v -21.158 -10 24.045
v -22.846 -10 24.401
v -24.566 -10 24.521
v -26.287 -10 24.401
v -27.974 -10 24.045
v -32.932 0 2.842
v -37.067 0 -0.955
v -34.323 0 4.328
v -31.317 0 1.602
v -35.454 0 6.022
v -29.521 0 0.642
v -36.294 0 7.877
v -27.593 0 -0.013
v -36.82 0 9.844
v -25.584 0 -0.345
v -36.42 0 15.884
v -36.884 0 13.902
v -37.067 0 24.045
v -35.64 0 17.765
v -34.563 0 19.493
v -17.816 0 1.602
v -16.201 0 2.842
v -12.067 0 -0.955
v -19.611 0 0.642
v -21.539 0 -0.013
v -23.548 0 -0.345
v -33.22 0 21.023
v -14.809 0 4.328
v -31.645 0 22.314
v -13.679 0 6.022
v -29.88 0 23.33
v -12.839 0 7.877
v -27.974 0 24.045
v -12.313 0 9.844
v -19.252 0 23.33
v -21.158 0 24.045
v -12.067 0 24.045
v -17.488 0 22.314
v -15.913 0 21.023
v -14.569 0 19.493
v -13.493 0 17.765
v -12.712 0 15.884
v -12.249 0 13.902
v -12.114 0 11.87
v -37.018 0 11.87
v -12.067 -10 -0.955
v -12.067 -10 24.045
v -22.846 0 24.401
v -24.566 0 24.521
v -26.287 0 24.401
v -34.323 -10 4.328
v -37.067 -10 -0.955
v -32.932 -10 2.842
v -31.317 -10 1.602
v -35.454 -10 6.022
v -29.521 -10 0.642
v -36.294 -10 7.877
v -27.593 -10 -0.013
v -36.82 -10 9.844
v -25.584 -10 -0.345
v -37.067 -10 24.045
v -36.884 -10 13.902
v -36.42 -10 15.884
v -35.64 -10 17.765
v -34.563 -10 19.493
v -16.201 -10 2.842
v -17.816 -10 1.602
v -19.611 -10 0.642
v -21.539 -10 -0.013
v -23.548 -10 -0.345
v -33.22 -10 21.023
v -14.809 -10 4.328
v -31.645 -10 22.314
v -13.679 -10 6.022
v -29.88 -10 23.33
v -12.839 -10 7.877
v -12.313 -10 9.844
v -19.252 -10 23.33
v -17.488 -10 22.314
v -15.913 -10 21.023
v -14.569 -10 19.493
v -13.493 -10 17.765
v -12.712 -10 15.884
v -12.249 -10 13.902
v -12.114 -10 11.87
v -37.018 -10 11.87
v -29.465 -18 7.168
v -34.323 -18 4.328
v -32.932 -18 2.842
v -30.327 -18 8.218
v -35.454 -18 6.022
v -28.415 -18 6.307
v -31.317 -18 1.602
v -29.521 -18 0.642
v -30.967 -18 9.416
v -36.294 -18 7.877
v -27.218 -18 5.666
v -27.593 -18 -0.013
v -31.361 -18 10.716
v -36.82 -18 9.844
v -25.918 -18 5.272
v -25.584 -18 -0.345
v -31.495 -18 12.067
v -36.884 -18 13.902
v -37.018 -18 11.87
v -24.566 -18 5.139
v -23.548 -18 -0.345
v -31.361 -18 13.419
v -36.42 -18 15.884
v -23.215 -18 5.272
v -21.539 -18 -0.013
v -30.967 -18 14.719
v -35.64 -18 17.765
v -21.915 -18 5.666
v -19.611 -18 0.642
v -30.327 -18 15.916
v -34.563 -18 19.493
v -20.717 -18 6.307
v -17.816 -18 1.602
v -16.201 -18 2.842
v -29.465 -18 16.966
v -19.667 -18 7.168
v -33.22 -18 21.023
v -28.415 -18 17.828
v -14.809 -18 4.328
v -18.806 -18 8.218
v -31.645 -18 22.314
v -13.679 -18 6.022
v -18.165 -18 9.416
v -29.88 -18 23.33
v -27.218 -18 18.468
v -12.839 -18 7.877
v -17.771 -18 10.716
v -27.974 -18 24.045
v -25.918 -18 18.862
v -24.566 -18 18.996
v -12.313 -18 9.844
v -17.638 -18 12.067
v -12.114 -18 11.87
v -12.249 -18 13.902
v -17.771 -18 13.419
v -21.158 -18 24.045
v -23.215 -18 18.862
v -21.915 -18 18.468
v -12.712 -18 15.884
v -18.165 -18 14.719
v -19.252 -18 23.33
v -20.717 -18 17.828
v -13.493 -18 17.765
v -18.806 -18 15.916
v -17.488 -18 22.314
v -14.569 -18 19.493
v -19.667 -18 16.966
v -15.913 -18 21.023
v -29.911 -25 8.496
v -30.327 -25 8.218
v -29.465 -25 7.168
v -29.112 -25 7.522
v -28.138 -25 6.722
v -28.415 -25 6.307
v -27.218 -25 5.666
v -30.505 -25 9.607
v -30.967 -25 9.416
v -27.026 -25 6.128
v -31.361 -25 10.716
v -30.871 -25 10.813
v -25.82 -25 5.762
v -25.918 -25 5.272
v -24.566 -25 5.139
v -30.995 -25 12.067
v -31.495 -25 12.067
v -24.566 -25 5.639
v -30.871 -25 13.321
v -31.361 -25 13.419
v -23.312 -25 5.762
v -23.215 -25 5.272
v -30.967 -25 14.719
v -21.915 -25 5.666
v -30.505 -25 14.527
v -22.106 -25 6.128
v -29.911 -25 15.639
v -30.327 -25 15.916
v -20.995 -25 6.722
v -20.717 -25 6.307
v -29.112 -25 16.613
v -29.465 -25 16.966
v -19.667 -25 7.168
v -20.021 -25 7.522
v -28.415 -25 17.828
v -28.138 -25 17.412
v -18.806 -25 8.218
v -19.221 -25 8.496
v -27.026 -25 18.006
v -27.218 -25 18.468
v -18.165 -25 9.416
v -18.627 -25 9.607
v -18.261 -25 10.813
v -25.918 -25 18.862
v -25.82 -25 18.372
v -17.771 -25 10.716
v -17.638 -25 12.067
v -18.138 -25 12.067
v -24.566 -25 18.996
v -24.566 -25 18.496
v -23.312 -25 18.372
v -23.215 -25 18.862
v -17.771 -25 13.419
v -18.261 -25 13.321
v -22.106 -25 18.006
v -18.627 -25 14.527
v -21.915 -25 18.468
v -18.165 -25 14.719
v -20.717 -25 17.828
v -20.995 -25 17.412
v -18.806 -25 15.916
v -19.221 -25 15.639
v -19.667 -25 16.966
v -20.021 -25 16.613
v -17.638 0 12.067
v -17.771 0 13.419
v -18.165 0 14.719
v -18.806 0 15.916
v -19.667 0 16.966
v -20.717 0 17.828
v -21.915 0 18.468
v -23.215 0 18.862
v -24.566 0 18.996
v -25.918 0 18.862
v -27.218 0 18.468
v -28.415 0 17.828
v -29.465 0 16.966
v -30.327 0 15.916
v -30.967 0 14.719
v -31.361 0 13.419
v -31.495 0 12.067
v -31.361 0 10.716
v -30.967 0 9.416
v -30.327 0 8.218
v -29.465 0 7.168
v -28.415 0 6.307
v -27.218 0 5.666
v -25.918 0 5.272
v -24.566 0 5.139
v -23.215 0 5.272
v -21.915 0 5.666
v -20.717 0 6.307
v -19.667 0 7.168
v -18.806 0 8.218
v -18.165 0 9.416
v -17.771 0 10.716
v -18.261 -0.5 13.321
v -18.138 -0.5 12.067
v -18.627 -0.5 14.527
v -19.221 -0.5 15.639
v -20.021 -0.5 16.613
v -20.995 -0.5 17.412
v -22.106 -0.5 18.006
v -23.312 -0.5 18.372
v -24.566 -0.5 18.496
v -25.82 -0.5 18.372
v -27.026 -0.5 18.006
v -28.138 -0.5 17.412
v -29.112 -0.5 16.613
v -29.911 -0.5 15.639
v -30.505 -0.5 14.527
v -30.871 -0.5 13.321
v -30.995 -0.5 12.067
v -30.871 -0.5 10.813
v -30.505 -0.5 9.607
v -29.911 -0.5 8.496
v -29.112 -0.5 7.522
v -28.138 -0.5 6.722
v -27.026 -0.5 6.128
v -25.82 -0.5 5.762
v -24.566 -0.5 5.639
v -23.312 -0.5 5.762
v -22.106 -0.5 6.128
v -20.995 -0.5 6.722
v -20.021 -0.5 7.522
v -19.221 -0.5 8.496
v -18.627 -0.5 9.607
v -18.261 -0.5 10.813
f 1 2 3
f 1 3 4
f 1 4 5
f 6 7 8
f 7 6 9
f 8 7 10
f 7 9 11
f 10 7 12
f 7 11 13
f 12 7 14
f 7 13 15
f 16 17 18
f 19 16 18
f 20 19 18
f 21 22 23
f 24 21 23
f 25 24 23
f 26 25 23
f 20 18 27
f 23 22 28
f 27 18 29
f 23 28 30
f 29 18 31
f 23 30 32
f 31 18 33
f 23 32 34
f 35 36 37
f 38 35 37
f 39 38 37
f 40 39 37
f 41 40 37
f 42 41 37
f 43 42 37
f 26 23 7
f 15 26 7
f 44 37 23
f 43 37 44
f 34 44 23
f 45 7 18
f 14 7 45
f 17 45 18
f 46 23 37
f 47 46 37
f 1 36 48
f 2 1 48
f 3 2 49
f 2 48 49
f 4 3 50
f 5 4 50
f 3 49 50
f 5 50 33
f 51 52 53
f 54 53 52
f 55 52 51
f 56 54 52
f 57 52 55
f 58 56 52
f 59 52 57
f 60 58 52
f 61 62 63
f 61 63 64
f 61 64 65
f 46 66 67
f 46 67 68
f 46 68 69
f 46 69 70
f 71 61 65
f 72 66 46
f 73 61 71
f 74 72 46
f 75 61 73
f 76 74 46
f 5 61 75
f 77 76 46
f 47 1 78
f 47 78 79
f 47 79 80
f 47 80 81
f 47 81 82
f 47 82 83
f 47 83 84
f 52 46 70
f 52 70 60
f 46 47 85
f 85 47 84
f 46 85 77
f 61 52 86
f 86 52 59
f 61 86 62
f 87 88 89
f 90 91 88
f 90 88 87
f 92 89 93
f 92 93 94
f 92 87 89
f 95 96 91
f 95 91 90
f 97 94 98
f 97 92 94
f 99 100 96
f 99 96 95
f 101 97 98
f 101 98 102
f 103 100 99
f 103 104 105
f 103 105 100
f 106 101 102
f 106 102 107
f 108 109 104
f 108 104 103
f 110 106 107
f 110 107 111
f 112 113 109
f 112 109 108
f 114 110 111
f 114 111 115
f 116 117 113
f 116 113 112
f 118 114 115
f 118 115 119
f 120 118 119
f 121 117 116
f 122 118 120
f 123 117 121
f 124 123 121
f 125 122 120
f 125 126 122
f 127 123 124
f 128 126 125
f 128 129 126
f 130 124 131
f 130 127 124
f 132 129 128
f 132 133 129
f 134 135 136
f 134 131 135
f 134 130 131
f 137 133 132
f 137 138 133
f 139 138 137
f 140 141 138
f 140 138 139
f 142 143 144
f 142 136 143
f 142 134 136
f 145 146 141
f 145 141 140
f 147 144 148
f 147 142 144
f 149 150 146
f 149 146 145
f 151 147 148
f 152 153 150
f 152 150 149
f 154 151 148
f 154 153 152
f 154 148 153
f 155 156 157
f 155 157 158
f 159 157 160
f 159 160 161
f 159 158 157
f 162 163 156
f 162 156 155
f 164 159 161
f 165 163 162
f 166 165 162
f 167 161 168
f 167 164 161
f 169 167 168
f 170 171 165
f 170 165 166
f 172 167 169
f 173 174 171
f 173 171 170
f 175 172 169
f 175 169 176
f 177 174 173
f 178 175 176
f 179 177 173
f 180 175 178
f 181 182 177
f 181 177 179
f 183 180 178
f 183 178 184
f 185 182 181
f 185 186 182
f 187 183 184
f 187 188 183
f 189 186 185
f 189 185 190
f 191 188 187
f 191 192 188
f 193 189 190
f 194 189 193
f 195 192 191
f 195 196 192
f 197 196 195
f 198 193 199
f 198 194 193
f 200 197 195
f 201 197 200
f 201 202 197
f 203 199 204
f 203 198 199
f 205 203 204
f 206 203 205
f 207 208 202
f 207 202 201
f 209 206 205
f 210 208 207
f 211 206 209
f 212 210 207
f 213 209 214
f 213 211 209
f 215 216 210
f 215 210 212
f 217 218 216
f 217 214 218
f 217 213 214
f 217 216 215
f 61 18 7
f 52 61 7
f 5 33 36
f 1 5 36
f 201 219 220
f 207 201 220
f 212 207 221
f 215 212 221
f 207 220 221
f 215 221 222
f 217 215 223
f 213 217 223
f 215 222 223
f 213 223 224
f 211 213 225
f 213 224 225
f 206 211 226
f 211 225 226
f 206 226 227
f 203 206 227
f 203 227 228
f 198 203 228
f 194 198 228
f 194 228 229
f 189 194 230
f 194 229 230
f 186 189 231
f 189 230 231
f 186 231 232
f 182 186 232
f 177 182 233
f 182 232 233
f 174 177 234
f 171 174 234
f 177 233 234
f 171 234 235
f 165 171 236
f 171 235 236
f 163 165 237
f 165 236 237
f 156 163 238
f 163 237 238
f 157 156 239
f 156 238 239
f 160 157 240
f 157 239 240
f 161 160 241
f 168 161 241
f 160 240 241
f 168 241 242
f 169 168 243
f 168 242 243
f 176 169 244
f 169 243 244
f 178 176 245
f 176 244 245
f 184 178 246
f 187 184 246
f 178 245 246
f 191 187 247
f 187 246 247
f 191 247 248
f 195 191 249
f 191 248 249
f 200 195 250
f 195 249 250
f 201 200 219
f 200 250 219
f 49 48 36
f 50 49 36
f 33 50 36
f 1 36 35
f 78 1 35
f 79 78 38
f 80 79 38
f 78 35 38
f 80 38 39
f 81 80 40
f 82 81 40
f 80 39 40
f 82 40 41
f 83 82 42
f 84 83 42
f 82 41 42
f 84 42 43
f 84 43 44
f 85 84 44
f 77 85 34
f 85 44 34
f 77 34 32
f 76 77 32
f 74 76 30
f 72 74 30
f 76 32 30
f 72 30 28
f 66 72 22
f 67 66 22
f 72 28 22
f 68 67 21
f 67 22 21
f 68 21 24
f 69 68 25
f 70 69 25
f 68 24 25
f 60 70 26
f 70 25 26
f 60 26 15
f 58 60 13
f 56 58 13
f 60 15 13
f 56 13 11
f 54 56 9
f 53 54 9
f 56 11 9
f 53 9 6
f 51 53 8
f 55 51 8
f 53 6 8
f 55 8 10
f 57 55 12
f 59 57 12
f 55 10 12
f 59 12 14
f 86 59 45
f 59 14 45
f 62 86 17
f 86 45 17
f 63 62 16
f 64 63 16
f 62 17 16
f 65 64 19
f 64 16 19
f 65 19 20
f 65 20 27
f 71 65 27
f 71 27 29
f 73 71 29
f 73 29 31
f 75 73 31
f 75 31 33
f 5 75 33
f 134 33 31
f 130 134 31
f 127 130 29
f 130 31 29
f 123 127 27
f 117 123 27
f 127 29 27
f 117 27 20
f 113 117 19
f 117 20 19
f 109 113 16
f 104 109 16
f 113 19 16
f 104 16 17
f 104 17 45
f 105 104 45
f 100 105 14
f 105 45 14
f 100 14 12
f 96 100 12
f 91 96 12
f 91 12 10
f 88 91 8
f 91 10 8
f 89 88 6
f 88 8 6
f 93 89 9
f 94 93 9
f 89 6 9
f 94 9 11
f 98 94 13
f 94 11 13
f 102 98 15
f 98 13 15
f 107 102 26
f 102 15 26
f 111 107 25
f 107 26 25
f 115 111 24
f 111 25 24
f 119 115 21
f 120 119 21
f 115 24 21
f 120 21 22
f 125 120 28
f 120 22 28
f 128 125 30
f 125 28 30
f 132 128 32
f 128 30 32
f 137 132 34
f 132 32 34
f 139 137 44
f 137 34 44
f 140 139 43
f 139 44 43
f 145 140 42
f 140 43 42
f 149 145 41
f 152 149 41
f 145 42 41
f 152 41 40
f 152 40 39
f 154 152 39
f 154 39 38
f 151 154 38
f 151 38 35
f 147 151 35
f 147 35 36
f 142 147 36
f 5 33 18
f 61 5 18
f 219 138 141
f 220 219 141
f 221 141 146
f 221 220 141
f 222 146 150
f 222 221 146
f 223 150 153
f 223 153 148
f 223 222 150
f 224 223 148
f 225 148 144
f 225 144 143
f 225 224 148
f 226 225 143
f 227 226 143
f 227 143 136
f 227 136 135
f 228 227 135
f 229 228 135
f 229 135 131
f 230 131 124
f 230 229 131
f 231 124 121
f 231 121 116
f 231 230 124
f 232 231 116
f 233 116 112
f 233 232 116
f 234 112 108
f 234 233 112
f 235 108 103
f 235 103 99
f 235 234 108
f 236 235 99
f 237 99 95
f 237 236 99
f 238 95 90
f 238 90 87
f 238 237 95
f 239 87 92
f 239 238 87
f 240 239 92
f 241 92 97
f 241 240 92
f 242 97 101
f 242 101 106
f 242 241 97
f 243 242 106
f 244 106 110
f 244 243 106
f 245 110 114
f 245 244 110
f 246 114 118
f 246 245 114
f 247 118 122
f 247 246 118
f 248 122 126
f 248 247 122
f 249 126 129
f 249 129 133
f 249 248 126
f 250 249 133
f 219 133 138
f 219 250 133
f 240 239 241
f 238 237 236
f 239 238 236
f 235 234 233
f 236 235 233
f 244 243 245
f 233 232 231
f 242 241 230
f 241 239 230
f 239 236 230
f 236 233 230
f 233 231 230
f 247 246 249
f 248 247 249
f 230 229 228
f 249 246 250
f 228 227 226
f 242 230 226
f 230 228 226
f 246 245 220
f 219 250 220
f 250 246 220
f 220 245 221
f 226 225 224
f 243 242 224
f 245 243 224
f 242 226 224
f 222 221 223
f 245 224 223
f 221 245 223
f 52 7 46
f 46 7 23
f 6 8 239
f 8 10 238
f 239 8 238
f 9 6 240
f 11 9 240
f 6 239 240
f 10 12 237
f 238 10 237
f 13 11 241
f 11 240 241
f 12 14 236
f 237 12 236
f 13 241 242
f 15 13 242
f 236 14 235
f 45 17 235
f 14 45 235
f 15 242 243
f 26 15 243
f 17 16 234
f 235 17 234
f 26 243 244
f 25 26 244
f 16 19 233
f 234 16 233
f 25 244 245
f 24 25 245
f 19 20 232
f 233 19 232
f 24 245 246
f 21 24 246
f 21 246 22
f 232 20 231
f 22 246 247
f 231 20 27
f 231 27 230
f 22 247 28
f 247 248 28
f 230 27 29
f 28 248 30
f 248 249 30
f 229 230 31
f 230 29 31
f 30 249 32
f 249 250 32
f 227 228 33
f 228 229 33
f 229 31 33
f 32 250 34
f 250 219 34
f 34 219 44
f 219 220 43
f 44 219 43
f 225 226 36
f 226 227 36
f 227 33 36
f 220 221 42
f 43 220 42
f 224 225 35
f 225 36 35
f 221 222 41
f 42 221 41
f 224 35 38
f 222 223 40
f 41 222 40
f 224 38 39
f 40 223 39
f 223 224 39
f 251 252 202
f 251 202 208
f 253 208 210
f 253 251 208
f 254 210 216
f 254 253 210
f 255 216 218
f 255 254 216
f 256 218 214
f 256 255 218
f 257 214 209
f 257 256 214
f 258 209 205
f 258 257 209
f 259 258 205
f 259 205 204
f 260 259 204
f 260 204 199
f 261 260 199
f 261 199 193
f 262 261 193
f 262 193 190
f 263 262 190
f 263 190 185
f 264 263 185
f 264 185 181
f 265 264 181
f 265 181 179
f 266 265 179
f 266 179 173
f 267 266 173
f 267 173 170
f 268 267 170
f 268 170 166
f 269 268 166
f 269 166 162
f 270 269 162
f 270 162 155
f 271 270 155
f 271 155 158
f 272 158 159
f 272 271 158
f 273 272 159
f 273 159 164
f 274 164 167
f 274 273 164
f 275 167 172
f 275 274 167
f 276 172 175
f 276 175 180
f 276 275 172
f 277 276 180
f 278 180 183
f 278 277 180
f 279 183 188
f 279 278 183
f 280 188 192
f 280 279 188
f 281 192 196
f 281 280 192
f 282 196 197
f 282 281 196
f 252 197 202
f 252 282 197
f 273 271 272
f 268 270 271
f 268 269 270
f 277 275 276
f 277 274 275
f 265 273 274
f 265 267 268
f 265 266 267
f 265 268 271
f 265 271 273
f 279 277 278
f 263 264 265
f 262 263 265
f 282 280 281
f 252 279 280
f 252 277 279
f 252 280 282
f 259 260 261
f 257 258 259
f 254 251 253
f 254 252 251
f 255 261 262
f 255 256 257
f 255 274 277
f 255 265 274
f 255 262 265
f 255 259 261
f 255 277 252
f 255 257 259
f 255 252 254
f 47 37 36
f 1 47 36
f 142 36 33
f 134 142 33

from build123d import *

# Parameters (mm, degrees)
F1_DEPTH = 10
F0_R     = 6.9283238466
F2_DEPTH = 25
F3_DEPTH = 18
F4_T     = -0.5


with BuildPart() as f1:
    # F0 (on Front) → F1 (new body)
    with BuildSketch(Plane.XZ):
        with BuildLine():
            Line((-37.0665900409, -0.9545833454), (-12.0665900409, -0.9545833454))
            Line((-12.0665900409, -0.9545833454), (-12.0665900409, 24.0454166546))
            Line((-12.0665900409, 24.0454166546), (-21.1584322736, 24.0454166546))
            ThreePointArc((-21.1584322736, 24.0454166546), (-14.6281833208, 19.5722570073), (-12.1126991035, 12.0672155172))
            ThreePointArc((-12.1126991035, 12.0672155172), (-32.0712690603, 2.1291712678), (-27.9740228668, 24.0454166546))
            Line((-27.9740228668, 24.0454166546), (-37.0665900409, 24.0454166546))
            Line((-37.0665900409, 24.0454166546), (-37.0665900409, -0.9545833454))
        make_face()
    extrude(amount=F1_DEPTH)


with BuildPart() as f1b:
    # F0 (on Front) → F1, piece 2 (new body)
    with BuildSketch(Plane.XZ):
        with BuildLine():
            Line((-27.9740228668, 24.0454166546), (-21.1584322736, 24.0454166546))
            ThreePointArc((-21.1584322736, 24.0454166546), (-24.5662275702, 24.5207439839), (-27.9740228668, 24.0454166546))
        make_face()
    extrude(amount=F1_DEPTH)


with BuildPart() as f2:
    # F0 (on Front) → F2 (new body)
    with BuildSketch(Plane.XZ):
        with Locations((-24.5662275702, 12.0672155172)):
            Circle(F0_R)
    extrude(amount=F2_DEPTH)

    # F4
    f4_openings = [f2.faces().sort_by_distance(p)[0] for p in [
        (-24.566228, -25, 12.067216),
    ]]
    offset(amount=F4_T, openings=f4_openings)


with BuildPart() as f3:
    # F0 (on Front) → F3 (new body)
    with BuildSketch(Plane.XZ):
        with BuildLine():
            ThreePointArc((-12.1126991035, 12.0672155172), (-14.6281833208, 19.5722570073), (-21.1584322736, 24.0454166546))
            Line((-21.1584322736, 24.0454166546), (-27.9740228668, 24.0454166546))
            ThreePointArc((-27.9740228668, 24.0454166546), (-32.0712690603, 2.1291712678), (-12.1126991035, 12.0672155172))
        make_face()
        with Locations((-24.5662275702, 12.0672155172)):
            Circle(F0_R, mode=Mode.SUBTRACT)
    extrude(amount=F3_DEPTH)


solid = Compound([f1.part, f1b.part, f2.part, f3.part])
